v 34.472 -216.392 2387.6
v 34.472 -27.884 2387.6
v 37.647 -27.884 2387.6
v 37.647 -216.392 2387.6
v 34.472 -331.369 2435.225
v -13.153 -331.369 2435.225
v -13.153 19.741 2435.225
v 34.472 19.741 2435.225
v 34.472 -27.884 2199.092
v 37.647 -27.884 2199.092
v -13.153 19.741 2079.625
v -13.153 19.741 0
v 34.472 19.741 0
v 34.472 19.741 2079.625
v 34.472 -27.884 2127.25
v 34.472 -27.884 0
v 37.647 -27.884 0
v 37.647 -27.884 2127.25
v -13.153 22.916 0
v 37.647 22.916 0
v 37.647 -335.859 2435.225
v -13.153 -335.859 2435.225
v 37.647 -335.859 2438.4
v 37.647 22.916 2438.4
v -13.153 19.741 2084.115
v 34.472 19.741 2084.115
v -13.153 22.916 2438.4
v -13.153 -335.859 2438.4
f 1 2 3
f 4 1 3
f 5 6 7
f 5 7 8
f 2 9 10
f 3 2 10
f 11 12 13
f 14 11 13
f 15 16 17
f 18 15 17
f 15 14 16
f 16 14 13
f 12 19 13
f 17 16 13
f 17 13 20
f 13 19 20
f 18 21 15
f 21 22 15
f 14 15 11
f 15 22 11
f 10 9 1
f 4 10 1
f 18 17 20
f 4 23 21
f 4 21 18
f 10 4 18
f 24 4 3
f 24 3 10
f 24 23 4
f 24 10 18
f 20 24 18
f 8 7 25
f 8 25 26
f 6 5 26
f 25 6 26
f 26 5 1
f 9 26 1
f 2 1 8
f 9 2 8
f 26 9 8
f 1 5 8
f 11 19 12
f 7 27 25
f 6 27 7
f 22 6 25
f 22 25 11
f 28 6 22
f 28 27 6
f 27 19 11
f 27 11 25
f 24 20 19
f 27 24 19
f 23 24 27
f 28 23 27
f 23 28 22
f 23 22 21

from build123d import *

# Parameters (mm, degrees)
F1_DEPTH  = 2438.4
F2_W      = 3.175
F2_H      = 50.8
F3_DEPTH  = 47.625
F5_DEPTH  = 355.6
F7_DEPTH  = 47.625
F9_DEPTH  = 3.175
F11_DEPTH = 25.4


with BuildPart() as f1:
    # F0 (on Top) → F1 (new body)
    with BuildSketch(Plane.XY):
        Polygon((37.646613, 22.916183), (-13.153387, 22.916183), (-13.153387, 19.741183), (34.471613, 19.741183), (34.471613, -27.883817), (37.646613, -27.883817), align=None)
    extrude(amount=F1_DEPTH)

    # F2 (on face) → F3 (cut)
    with BuildSketch(Plane.XZ.offset(27.883817)):
        with Locations((36.059113, 2413)):
            Rectangle(F2_W, F2_H)
    extrude(amount=-F3_DEPTH, mode=Mode.SUBTRACT)

    # F4 (on face) → F5 (join)
    with BuildSketch(Plane.XZ.offset(-19.741183)):
        Polygon((37.646613, 2438.4), (-13.153387, 2438.4), (-13.153387, 2435.225), (34.471613, 2435.225), (34.471613, 2387.6), (37.646613, 2387.6), align=None)
    extrude(amount=F5_DEPTH)

    # F6 (on face) → F7 (join)
    with BuildSketch(Plane(origin=(34.471613, 0, 0), x_dir=(0, -1, 0), z_dir=(-1, 0, 0))):
        Polygon((-19.741183, 2079.625), (335.858817, 2435.225), (331.368689, 2435.225), (-19.741183, 2084.115128), align=None)
    extrude(amount=F7_DEPTH)

    # F8 (on face) → F9 (join)
    with BuildSketch(Plane.YZ.offset(34.471613)):
        Polygon((-216.391768, 2387.6), (-288.233817, 2387.6), (-27.883817, 2127.25), (-27.883817, 2199.092049), align=None)
    extrude(amount=F9_DEPTH)

    # F10 (on face) → F11 (cut)
    with BuildSketch(Plane(origin=(34.471613, 0, 0), x_dir=(0, -1, 0), z_dir=(-1, 0, 0))):
        Polygon((335.858817, 2387.6), (335.858817, 2435.225), (288.233817, 2387.6), align=None)
    extrude(amount=-F11_DEPTH, mode=Mode.SUBTRACT)


solid = f1.part
